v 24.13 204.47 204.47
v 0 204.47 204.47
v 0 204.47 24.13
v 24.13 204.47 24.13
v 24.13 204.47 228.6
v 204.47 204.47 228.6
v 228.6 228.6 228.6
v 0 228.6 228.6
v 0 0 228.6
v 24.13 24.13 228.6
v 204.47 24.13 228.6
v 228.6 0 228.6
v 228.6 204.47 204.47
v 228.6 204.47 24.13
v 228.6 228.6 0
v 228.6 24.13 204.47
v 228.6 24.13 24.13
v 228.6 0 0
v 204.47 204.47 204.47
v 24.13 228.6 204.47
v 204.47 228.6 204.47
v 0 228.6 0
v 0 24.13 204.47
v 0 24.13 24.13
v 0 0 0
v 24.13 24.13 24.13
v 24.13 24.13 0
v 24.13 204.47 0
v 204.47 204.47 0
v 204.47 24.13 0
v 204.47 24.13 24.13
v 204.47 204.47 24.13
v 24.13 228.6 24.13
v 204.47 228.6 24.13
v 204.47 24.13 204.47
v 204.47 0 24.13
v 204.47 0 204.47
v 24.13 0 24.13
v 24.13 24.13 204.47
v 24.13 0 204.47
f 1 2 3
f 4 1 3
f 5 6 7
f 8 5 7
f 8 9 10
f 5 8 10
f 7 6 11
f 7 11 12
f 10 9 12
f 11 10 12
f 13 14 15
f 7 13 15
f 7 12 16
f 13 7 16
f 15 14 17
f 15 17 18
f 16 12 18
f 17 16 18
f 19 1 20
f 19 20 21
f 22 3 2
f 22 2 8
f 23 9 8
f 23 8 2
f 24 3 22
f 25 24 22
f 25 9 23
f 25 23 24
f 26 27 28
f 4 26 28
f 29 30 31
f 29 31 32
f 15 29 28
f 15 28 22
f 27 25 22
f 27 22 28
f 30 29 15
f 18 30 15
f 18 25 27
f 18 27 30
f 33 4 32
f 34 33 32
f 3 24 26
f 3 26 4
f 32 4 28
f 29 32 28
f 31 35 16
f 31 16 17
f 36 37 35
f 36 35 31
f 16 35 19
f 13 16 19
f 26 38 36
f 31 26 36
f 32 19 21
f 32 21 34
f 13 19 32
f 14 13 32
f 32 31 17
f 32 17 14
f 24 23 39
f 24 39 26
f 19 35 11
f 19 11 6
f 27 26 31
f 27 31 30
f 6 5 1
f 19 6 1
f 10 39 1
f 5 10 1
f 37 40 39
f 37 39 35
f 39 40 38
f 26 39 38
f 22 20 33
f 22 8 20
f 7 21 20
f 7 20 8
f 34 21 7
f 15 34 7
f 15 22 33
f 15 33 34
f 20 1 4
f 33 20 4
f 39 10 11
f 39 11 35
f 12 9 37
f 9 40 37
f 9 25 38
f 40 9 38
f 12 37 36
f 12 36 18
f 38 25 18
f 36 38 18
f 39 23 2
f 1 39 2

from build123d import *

# Parameters (mm, degrees)
SKETCH1_W               = 228.6
SKETCH1_H               = 228.6
BOSS_EXTRUDE1_DEPTH     = 228.6
CUT_EXTRUDE2_DEPTH      = 396.94681461
CUT_EXTRUDE2_DEPTH_BACK = 396.94681461
SKETCH2_W               = 180.34
SKETCH2_H               = 180.34
SKETCH3_W               = 180.34
SKETCH3_H               = 180.34
CUT_EXTRUDE4_DEPTH      = 396.94681461
SKETCH4_W               = 180.34
SKETCH4_H               = 180.34
CUT_EXTRUDE5_DEPTH      = 396.94681461


with BuildPart() as part:
    # Sketch1 → Boss-Extrude1 (new body)
    with BuildSketch(Plane(origin=(0, 0, 0), x_dir=(1, 0, 0), z_dir=(0, 1, 0))):
        with Locations((114.3, -114.3)):
            Rectangle(SKETCH1_W, SKETCH1_H)
    extrude(amount=BOSS_EXTRUDE1_DEPTH)

    # Sketch2 → Cut-Extrude2 (cut, two sides: drawn at the far end of the back side and taken through both)
    with BuildSketch(Plane.XY.offset(-CUT_EXTRUDE2_DEPTH_BACK)):
        with Locations((114.3, 114.3)):
            Rectangle(SKETCH2_W, SKETCH2_H)
    extrude(amount=CUT_EXTRUDE2_DEPTH + CUT_EXTRUDE2_DEPTH_BACK, mode=Mode.SUBTRACT)

    # Sketch3 → Cut-Extrude4 (cut, through all)
    with BuildSketch(Plane(origin=(0, 0, 0), x_dir=(0, 0, -1), z_dir=(1, 0, 0))):
        with Locations((-114.3, 114.3)):
            Rectangle(SKETCH3_W, SKETCH3_H)
    extrude(amount=CUT_EXTRUDE4_DEPTH, mode=Mode.SUBTRACT)

    # Sketch4 → Cut-Extrude5 (cut, through all)
    with BuildSketch(Plane(origin=(0, 0, 0), x_dir=(1, 0, 0), z_dir=(0, 1, 0))):
        with Locations((114.3, -114.3)):
            Rectangle(SKETCH4_W, SKETCH4_H)
    extrude(amount=CUT_EXTRUDE5_DEPTH, mode=Mode.SUBTRACT)


solid = part.part
